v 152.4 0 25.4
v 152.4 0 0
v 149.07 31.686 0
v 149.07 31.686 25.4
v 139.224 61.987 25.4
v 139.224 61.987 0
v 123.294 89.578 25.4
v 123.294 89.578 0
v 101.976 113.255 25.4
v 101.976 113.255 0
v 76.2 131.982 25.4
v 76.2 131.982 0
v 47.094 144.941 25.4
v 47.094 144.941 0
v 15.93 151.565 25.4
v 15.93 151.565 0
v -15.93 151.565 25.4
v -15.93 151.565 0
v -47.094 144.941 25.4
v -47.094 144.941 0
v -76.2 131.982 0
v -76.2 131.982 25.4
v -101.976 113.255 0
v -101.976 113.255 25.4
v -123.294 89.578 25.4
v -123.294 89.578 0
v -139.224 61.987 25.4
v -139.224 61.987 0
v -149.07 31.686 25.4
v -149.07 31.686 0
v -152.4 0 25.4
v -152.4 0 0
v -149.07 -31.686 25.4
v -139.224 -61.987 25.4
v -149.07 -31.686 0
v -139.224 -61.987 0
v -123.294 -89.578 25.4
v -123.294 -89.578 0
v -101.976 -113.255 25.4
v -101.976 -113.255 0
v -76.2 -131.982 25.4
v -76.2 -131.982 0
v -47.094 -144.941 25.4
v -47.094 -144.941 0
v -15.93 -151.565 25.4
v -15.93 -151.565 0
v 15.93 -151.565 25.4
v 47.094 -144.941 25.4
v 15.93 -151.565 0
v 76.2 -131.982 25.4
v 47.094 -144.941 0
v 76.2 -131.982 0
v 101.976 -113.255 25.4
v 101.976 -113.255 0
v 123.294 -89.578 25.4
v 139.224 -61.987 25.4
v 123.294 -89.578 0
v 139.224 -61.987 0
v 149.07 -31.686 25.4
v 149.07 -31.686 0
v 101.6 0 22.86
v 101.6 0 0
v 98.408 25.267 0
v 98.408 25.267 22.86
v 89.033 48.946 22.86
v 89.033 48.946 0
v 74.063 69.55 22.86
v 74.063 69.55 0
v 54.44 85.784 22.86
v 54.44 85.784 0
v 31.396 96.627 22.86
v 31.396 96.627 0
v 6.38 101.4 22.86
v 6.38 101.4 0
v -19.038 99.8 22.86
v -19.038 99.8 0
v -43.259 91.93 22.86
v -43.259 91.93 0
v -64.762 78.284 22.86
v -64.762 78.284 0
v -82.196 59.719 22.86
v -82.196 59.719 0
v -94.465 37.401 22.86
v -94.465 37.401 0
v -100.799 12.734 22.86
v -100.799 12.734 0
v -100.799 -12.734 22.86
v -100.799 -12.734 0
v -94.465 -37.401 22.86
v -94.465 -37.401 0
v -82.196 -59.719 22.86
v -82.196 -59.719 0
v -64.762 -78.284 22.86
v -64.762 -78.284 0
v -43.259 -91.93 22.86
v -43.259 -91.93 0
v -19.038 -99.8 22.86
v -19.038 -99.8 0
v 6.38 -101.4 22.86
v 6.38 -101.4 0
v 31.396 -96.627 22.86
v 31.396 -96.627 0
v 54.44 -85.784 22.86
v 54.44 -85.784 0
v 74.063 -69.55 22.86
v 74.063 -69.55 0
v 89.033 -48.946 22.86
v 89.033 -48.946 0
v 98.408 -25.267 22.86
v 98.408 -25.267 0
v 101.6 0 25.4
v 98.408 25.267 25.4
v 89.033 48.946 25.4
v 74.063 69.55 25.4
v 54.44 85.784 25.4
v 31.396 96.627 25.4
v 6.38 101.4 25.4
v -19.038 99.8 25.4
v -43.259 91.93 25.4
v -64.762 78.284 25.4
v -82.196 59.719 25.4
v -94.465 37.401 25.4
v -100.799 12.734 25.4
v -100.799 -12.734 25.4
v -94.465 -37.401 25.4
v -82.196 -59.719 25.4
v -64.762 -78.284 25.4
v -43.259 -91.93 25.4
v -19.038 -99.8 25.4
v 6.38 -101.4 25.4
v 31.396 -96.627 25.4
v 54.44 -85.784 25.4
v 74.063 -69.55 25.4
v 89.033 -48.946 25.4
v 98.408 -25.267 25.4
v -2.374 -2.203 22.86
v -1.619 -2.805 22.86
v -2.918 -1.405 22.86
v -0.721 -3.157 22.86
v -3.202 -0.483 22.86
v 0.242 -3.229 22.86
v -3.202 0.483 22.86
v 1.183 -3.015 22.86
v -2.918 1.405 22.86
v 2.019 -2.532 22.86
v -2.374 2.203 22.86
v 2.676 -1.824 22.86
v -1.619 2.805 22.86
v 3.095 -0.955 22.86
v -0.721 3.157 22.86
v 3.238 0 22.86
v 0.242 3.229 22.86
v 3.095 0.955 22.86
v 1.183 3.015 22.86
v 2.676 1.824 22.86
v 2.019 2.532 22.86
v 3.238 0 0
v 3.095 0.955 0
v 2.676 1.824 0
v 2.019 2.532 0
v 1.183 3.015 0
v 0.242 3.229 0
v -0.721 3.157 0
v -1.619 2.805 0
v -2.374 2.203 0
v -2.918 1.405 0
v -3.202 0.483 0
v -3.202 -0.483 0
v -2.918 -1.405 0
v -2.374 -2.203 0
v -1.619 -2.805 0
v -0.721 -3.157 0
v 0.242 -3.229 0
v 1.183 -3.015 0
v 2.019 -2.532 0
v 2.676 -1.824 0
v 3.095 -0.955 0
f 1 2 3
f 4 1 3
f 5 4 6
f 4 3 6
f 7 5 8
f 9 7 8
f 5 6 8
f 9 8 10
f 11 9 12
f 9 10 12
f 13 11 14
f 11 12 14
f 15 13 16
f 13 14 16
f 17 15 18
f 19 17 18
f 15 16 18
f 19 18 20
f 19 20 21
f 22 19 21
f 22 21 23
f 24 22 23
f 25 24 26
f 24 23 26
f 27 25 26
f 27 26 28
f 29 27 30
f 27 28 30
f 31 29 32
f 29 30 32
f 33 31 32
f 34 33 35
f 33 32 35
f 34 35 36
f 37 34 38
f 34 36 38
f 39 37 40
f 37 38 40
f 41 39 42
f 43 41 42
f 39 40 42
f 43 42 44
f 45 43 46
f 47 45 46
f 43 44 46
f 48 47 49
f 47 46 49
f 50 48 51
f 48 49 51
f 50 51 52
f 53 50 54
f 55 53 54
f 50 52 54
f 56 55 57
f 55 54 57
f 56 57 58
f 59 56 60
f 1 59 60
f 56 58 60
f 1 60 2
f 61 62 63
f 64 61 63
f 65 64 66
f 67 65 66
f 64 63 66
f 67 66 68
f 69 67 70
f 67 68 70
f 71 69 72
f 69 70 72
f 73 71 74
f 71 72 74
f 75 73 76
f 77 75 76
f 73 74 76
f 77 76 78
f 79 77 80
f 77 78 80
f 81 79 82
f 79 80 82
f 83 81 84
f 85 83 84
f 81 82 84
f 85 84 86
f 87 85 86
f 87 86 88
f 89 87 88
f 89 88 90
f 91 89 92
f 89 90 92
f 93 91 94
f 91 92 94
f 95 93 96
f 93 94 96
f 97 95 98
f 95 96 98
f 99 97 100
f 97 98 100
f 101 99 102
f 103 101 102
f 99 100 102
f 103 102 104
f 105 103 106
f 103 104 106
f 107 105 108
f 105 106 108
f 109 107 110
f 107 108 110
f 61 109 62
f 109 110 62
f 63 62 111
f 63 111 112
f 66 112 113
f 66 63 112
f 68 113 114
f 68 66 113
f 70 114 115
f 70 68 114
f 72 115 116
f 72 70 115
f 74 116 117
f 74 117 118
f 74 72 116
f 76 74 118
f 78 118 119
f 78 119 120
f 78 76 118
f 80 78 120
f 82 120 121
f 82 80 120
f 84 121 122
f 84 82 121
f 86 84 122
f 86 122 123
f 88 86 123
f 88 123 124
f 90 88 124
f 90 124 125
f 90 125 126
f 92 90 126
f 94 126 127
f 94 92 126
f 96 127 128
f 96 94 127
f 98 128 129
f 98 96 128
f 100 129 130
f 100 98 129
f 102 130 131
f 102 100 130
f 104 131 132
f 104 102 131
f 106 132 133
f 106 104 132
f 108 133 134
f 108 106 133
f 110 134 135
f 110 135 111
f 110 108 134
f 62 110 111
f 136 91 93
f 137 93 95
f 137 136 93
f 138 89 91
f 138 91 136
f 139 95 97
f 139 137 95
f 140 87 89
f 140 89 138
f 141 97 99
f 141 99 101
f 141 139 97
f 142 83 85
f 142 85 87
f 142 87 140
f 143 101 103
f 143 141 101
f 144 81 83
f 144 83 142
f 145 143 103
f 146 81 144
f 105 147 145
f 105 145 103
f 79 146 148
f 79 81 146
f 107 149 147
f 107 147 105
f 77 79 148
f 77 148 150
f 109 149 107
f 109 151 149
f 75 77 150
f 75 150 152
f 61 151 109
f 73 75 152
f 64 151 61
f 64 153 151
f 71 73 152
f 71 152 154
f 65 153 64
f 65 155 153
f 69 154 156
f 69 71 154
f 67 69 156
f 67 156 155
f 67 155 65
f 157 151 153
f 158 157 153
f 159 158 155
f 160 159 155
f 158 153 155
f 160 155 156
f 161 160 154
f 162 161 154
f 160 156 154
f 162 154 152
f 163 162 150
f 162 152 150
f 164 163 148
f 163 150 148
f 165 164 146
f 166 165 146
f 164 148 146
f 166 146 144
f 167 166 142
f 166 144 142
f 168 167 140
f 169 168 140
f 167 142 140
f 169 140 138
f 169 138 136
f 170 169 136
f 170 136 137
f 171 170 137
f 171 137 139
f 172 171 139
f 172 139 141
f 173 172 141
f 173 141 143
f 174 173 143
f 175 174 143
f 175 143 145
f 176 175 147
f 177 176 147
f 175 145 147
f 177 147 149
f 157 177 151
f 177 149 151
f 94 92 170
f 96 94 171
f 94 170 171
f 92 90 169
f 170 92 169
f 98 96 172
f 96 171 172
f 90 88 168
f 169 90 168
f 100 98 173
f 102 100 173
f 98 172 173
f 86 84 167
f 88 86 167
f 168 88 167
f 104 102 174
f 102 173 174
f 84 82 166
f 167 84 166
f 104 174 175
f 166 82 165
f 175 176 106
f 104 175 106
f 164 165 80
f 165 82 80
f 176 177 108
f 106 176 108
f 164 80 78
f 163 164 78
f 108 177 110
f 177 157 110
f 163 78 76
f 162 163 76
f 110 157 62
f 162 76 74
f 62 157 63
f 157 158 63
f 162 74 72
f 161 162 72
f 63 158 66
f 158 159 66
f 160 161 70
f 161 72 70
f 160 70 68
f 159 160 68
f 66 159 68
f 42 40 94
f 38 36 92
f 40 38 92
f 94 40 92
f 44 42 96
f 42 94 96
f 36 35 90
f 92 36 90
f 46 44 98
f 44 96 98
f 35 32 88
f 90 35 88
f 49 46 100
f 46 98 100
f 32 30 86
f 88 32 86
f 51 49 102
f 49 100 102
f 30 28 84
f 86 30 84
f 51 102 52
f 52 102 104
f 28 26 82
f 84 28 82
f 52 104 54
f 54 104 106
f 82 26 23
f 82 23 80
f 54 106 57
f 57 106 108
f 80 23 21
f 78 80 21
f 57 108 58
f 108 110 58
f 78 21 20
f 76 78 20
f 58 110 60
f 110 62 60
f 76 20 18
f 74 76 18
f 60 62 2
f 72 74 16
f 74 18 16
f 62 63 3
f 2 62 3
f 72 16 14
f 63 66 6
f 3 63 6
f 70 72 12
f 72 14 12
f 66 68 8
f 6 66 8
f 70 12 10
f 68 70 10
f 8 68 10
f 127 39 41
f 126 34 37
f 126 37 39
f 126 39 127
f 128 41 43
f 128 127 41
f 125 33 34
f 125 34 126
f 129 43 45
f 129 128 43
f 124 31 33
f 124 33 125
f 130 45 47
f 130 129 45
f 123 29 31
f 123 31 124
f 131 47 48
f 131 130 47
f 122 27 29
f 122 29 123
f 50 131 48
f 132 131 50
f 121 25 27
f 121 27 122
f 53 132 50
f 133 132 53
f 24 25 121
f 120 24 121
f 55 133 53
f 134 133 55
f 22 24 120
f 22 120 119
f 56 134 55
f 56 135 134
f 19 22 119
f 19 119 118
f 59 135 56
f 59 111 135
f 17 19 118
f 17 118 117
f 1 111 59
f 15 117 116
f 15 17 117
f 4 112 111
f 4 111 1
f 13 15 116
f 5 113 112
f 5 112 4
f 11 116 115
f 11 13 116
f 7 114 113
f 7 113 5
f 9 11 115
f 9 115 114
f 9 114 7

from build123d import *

# Parameters (mm, degrees)
F0_R     = 101.6
F1_DEPTH = 22.86
F2_R     = 3.2385
F3_DEPTH = 22.86
F4_R     = 152.4
F4_R_2   = 101.6
F5_DEPTH = 25.4


with BuildPart() as f1:
    # F0 (on Top) → F1 (new body)
    with BuildSketch(Plane.XY):
        Circle(F0_R)
    extrude(amount=F1_DEPTH)

    # F2 (on face) → F3 (cut, through all)
    with BuildSketch(Plane.XY.offset(22.86)):
        Circle(F2_R)
    extrude(amount=-F3_DEPTH, mode=Mode.SUBTRACT)


with BuildPart() as f5:
    # F4 (on Top) → F5 (new body)
    with BuildSketch(Plane.XY):
        Circle(F4_R)
        Circle(F4_R_2, mode=Mode.SUBTRACT)
    extrude(amount=F5_DEPTH)


solid = Compound([f1.part, f5.part])
